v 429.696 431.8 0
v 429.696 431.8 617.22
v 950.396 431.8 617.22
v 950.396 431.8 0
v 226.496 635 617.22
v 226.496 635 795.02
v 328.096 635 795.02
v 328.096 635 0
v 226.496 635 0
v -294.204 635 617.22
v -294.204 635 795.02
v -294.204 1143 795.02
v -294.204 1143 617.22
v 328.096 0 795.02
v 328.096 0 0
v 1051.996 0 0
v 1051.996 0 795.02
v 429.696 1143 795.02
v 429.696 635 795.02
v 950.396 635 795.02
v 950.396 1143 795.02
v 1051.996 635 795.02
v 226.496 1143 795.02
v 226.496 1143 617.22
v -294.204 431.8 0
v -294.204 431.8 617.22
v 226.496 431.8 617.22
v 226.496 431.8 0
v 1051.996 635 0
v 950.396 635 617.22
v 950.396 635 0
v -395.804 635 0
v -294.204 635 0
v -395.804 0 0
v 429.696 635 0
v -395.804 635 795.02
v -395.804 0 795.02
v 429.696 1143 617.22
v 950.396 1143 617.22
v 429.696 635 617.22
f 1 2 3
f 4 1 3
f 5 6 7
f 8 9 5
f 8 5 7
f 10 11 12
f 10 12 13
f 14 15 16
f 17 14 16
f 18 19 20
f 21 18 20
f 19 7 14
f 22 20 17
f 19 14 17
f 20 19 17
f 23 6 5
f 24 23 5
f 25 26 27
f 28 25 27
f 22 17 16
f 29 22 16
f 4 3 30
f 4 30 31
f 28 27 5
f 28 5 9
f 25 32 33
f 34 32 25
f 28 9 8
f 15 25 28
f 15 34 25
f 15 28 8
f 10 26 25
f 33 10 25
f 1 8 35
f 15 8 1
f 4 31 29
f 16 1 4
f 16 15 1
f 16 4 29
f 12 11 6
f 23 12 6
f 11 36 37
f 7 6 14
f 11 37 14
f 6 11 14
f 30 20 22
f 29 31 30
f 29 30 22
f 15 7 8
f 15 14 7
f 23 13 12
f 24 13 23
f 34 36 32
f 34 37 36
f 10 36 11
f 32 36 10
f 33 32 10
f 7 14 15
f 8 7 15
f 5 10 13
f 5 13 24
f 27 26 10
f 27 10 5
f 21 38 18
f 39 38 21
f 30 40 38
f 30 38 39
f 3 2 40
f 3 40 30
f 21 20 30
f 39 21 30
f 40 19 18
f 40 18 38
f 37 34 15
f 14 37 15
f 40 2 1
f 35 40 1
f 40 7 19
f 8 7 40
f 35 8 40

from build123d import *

# Parameters (mm, degrees)
SKETCH1_W           = 723.9
SKETCH1_H           = 795.02
BOSS_EXTRUDE1_DEPTH = 431.8
SKETCH2_W           = 101.6
SKETCH2_H           = 795.02
BOSS_EXTRUDE2_DEPTH = 203.2
SKETCH3_W           = 520.7
SKETCH3_H           = 177.8
BOSS_EXTRUDE3_DEPTH = 711.2
LPATTERN1_COUNT     = 2
LPATTERN1_PITCH     = 723.9


with BuildPart() as part:
    # Sketch1 → Boss-Extrude1 (new body)
    with BuildSketch(Plane(origin=(0, 0, 0), x_dir=(1, 0, 0), z_dir=(0, 1, 0))):
        with Locations((-33.853948498, -397.51)):
            Rectangle(SKETCH1_W, SKETCH1_H)
    extrude(amount=BOSS_EXTRUDE1_DEPTH)

    # Sketch2 → Boss-Extrude2 (add)
    with BuildSketch(Plane(origin=(0, 431.8, 0), x_dir=(1, 0, 0), z_dir=(0, 1, 0))):
        with Locations((-345.003948498, -397.51)):
            Rectangle(SKETCH2_W, SKETCH2_H)
        with Locations((277.296051502, -397.51)):
            Rectangle(SKETCH2_W, SKETCH2_H)
    extrude(amount=BOSS_EXTRUDE2_DEPTH)

    # Sketch3 → Boss-Extrude3 (add)
    with BuildSketch(Plane(origin=(0, 431.8, 0), x_dir=(1, 0, 0), z_dir=(0, 1, 0))):
        with Locations((-33.853948498, -706.12)):
            Rectangle(SKETCH3_W, SKETCH3_H)
    extrude(amount=BOSS_EXTRUDE3_DEPTH)


with BuildPart() as lpattern1_1:
    # LPattern1: pattern copy
    add(part.part.moved(Location(Vector(1, 0, 0) * (1 * LPATTERN1_PITCH))))


solid = Compound([part.part, lpattern1_1.part])
